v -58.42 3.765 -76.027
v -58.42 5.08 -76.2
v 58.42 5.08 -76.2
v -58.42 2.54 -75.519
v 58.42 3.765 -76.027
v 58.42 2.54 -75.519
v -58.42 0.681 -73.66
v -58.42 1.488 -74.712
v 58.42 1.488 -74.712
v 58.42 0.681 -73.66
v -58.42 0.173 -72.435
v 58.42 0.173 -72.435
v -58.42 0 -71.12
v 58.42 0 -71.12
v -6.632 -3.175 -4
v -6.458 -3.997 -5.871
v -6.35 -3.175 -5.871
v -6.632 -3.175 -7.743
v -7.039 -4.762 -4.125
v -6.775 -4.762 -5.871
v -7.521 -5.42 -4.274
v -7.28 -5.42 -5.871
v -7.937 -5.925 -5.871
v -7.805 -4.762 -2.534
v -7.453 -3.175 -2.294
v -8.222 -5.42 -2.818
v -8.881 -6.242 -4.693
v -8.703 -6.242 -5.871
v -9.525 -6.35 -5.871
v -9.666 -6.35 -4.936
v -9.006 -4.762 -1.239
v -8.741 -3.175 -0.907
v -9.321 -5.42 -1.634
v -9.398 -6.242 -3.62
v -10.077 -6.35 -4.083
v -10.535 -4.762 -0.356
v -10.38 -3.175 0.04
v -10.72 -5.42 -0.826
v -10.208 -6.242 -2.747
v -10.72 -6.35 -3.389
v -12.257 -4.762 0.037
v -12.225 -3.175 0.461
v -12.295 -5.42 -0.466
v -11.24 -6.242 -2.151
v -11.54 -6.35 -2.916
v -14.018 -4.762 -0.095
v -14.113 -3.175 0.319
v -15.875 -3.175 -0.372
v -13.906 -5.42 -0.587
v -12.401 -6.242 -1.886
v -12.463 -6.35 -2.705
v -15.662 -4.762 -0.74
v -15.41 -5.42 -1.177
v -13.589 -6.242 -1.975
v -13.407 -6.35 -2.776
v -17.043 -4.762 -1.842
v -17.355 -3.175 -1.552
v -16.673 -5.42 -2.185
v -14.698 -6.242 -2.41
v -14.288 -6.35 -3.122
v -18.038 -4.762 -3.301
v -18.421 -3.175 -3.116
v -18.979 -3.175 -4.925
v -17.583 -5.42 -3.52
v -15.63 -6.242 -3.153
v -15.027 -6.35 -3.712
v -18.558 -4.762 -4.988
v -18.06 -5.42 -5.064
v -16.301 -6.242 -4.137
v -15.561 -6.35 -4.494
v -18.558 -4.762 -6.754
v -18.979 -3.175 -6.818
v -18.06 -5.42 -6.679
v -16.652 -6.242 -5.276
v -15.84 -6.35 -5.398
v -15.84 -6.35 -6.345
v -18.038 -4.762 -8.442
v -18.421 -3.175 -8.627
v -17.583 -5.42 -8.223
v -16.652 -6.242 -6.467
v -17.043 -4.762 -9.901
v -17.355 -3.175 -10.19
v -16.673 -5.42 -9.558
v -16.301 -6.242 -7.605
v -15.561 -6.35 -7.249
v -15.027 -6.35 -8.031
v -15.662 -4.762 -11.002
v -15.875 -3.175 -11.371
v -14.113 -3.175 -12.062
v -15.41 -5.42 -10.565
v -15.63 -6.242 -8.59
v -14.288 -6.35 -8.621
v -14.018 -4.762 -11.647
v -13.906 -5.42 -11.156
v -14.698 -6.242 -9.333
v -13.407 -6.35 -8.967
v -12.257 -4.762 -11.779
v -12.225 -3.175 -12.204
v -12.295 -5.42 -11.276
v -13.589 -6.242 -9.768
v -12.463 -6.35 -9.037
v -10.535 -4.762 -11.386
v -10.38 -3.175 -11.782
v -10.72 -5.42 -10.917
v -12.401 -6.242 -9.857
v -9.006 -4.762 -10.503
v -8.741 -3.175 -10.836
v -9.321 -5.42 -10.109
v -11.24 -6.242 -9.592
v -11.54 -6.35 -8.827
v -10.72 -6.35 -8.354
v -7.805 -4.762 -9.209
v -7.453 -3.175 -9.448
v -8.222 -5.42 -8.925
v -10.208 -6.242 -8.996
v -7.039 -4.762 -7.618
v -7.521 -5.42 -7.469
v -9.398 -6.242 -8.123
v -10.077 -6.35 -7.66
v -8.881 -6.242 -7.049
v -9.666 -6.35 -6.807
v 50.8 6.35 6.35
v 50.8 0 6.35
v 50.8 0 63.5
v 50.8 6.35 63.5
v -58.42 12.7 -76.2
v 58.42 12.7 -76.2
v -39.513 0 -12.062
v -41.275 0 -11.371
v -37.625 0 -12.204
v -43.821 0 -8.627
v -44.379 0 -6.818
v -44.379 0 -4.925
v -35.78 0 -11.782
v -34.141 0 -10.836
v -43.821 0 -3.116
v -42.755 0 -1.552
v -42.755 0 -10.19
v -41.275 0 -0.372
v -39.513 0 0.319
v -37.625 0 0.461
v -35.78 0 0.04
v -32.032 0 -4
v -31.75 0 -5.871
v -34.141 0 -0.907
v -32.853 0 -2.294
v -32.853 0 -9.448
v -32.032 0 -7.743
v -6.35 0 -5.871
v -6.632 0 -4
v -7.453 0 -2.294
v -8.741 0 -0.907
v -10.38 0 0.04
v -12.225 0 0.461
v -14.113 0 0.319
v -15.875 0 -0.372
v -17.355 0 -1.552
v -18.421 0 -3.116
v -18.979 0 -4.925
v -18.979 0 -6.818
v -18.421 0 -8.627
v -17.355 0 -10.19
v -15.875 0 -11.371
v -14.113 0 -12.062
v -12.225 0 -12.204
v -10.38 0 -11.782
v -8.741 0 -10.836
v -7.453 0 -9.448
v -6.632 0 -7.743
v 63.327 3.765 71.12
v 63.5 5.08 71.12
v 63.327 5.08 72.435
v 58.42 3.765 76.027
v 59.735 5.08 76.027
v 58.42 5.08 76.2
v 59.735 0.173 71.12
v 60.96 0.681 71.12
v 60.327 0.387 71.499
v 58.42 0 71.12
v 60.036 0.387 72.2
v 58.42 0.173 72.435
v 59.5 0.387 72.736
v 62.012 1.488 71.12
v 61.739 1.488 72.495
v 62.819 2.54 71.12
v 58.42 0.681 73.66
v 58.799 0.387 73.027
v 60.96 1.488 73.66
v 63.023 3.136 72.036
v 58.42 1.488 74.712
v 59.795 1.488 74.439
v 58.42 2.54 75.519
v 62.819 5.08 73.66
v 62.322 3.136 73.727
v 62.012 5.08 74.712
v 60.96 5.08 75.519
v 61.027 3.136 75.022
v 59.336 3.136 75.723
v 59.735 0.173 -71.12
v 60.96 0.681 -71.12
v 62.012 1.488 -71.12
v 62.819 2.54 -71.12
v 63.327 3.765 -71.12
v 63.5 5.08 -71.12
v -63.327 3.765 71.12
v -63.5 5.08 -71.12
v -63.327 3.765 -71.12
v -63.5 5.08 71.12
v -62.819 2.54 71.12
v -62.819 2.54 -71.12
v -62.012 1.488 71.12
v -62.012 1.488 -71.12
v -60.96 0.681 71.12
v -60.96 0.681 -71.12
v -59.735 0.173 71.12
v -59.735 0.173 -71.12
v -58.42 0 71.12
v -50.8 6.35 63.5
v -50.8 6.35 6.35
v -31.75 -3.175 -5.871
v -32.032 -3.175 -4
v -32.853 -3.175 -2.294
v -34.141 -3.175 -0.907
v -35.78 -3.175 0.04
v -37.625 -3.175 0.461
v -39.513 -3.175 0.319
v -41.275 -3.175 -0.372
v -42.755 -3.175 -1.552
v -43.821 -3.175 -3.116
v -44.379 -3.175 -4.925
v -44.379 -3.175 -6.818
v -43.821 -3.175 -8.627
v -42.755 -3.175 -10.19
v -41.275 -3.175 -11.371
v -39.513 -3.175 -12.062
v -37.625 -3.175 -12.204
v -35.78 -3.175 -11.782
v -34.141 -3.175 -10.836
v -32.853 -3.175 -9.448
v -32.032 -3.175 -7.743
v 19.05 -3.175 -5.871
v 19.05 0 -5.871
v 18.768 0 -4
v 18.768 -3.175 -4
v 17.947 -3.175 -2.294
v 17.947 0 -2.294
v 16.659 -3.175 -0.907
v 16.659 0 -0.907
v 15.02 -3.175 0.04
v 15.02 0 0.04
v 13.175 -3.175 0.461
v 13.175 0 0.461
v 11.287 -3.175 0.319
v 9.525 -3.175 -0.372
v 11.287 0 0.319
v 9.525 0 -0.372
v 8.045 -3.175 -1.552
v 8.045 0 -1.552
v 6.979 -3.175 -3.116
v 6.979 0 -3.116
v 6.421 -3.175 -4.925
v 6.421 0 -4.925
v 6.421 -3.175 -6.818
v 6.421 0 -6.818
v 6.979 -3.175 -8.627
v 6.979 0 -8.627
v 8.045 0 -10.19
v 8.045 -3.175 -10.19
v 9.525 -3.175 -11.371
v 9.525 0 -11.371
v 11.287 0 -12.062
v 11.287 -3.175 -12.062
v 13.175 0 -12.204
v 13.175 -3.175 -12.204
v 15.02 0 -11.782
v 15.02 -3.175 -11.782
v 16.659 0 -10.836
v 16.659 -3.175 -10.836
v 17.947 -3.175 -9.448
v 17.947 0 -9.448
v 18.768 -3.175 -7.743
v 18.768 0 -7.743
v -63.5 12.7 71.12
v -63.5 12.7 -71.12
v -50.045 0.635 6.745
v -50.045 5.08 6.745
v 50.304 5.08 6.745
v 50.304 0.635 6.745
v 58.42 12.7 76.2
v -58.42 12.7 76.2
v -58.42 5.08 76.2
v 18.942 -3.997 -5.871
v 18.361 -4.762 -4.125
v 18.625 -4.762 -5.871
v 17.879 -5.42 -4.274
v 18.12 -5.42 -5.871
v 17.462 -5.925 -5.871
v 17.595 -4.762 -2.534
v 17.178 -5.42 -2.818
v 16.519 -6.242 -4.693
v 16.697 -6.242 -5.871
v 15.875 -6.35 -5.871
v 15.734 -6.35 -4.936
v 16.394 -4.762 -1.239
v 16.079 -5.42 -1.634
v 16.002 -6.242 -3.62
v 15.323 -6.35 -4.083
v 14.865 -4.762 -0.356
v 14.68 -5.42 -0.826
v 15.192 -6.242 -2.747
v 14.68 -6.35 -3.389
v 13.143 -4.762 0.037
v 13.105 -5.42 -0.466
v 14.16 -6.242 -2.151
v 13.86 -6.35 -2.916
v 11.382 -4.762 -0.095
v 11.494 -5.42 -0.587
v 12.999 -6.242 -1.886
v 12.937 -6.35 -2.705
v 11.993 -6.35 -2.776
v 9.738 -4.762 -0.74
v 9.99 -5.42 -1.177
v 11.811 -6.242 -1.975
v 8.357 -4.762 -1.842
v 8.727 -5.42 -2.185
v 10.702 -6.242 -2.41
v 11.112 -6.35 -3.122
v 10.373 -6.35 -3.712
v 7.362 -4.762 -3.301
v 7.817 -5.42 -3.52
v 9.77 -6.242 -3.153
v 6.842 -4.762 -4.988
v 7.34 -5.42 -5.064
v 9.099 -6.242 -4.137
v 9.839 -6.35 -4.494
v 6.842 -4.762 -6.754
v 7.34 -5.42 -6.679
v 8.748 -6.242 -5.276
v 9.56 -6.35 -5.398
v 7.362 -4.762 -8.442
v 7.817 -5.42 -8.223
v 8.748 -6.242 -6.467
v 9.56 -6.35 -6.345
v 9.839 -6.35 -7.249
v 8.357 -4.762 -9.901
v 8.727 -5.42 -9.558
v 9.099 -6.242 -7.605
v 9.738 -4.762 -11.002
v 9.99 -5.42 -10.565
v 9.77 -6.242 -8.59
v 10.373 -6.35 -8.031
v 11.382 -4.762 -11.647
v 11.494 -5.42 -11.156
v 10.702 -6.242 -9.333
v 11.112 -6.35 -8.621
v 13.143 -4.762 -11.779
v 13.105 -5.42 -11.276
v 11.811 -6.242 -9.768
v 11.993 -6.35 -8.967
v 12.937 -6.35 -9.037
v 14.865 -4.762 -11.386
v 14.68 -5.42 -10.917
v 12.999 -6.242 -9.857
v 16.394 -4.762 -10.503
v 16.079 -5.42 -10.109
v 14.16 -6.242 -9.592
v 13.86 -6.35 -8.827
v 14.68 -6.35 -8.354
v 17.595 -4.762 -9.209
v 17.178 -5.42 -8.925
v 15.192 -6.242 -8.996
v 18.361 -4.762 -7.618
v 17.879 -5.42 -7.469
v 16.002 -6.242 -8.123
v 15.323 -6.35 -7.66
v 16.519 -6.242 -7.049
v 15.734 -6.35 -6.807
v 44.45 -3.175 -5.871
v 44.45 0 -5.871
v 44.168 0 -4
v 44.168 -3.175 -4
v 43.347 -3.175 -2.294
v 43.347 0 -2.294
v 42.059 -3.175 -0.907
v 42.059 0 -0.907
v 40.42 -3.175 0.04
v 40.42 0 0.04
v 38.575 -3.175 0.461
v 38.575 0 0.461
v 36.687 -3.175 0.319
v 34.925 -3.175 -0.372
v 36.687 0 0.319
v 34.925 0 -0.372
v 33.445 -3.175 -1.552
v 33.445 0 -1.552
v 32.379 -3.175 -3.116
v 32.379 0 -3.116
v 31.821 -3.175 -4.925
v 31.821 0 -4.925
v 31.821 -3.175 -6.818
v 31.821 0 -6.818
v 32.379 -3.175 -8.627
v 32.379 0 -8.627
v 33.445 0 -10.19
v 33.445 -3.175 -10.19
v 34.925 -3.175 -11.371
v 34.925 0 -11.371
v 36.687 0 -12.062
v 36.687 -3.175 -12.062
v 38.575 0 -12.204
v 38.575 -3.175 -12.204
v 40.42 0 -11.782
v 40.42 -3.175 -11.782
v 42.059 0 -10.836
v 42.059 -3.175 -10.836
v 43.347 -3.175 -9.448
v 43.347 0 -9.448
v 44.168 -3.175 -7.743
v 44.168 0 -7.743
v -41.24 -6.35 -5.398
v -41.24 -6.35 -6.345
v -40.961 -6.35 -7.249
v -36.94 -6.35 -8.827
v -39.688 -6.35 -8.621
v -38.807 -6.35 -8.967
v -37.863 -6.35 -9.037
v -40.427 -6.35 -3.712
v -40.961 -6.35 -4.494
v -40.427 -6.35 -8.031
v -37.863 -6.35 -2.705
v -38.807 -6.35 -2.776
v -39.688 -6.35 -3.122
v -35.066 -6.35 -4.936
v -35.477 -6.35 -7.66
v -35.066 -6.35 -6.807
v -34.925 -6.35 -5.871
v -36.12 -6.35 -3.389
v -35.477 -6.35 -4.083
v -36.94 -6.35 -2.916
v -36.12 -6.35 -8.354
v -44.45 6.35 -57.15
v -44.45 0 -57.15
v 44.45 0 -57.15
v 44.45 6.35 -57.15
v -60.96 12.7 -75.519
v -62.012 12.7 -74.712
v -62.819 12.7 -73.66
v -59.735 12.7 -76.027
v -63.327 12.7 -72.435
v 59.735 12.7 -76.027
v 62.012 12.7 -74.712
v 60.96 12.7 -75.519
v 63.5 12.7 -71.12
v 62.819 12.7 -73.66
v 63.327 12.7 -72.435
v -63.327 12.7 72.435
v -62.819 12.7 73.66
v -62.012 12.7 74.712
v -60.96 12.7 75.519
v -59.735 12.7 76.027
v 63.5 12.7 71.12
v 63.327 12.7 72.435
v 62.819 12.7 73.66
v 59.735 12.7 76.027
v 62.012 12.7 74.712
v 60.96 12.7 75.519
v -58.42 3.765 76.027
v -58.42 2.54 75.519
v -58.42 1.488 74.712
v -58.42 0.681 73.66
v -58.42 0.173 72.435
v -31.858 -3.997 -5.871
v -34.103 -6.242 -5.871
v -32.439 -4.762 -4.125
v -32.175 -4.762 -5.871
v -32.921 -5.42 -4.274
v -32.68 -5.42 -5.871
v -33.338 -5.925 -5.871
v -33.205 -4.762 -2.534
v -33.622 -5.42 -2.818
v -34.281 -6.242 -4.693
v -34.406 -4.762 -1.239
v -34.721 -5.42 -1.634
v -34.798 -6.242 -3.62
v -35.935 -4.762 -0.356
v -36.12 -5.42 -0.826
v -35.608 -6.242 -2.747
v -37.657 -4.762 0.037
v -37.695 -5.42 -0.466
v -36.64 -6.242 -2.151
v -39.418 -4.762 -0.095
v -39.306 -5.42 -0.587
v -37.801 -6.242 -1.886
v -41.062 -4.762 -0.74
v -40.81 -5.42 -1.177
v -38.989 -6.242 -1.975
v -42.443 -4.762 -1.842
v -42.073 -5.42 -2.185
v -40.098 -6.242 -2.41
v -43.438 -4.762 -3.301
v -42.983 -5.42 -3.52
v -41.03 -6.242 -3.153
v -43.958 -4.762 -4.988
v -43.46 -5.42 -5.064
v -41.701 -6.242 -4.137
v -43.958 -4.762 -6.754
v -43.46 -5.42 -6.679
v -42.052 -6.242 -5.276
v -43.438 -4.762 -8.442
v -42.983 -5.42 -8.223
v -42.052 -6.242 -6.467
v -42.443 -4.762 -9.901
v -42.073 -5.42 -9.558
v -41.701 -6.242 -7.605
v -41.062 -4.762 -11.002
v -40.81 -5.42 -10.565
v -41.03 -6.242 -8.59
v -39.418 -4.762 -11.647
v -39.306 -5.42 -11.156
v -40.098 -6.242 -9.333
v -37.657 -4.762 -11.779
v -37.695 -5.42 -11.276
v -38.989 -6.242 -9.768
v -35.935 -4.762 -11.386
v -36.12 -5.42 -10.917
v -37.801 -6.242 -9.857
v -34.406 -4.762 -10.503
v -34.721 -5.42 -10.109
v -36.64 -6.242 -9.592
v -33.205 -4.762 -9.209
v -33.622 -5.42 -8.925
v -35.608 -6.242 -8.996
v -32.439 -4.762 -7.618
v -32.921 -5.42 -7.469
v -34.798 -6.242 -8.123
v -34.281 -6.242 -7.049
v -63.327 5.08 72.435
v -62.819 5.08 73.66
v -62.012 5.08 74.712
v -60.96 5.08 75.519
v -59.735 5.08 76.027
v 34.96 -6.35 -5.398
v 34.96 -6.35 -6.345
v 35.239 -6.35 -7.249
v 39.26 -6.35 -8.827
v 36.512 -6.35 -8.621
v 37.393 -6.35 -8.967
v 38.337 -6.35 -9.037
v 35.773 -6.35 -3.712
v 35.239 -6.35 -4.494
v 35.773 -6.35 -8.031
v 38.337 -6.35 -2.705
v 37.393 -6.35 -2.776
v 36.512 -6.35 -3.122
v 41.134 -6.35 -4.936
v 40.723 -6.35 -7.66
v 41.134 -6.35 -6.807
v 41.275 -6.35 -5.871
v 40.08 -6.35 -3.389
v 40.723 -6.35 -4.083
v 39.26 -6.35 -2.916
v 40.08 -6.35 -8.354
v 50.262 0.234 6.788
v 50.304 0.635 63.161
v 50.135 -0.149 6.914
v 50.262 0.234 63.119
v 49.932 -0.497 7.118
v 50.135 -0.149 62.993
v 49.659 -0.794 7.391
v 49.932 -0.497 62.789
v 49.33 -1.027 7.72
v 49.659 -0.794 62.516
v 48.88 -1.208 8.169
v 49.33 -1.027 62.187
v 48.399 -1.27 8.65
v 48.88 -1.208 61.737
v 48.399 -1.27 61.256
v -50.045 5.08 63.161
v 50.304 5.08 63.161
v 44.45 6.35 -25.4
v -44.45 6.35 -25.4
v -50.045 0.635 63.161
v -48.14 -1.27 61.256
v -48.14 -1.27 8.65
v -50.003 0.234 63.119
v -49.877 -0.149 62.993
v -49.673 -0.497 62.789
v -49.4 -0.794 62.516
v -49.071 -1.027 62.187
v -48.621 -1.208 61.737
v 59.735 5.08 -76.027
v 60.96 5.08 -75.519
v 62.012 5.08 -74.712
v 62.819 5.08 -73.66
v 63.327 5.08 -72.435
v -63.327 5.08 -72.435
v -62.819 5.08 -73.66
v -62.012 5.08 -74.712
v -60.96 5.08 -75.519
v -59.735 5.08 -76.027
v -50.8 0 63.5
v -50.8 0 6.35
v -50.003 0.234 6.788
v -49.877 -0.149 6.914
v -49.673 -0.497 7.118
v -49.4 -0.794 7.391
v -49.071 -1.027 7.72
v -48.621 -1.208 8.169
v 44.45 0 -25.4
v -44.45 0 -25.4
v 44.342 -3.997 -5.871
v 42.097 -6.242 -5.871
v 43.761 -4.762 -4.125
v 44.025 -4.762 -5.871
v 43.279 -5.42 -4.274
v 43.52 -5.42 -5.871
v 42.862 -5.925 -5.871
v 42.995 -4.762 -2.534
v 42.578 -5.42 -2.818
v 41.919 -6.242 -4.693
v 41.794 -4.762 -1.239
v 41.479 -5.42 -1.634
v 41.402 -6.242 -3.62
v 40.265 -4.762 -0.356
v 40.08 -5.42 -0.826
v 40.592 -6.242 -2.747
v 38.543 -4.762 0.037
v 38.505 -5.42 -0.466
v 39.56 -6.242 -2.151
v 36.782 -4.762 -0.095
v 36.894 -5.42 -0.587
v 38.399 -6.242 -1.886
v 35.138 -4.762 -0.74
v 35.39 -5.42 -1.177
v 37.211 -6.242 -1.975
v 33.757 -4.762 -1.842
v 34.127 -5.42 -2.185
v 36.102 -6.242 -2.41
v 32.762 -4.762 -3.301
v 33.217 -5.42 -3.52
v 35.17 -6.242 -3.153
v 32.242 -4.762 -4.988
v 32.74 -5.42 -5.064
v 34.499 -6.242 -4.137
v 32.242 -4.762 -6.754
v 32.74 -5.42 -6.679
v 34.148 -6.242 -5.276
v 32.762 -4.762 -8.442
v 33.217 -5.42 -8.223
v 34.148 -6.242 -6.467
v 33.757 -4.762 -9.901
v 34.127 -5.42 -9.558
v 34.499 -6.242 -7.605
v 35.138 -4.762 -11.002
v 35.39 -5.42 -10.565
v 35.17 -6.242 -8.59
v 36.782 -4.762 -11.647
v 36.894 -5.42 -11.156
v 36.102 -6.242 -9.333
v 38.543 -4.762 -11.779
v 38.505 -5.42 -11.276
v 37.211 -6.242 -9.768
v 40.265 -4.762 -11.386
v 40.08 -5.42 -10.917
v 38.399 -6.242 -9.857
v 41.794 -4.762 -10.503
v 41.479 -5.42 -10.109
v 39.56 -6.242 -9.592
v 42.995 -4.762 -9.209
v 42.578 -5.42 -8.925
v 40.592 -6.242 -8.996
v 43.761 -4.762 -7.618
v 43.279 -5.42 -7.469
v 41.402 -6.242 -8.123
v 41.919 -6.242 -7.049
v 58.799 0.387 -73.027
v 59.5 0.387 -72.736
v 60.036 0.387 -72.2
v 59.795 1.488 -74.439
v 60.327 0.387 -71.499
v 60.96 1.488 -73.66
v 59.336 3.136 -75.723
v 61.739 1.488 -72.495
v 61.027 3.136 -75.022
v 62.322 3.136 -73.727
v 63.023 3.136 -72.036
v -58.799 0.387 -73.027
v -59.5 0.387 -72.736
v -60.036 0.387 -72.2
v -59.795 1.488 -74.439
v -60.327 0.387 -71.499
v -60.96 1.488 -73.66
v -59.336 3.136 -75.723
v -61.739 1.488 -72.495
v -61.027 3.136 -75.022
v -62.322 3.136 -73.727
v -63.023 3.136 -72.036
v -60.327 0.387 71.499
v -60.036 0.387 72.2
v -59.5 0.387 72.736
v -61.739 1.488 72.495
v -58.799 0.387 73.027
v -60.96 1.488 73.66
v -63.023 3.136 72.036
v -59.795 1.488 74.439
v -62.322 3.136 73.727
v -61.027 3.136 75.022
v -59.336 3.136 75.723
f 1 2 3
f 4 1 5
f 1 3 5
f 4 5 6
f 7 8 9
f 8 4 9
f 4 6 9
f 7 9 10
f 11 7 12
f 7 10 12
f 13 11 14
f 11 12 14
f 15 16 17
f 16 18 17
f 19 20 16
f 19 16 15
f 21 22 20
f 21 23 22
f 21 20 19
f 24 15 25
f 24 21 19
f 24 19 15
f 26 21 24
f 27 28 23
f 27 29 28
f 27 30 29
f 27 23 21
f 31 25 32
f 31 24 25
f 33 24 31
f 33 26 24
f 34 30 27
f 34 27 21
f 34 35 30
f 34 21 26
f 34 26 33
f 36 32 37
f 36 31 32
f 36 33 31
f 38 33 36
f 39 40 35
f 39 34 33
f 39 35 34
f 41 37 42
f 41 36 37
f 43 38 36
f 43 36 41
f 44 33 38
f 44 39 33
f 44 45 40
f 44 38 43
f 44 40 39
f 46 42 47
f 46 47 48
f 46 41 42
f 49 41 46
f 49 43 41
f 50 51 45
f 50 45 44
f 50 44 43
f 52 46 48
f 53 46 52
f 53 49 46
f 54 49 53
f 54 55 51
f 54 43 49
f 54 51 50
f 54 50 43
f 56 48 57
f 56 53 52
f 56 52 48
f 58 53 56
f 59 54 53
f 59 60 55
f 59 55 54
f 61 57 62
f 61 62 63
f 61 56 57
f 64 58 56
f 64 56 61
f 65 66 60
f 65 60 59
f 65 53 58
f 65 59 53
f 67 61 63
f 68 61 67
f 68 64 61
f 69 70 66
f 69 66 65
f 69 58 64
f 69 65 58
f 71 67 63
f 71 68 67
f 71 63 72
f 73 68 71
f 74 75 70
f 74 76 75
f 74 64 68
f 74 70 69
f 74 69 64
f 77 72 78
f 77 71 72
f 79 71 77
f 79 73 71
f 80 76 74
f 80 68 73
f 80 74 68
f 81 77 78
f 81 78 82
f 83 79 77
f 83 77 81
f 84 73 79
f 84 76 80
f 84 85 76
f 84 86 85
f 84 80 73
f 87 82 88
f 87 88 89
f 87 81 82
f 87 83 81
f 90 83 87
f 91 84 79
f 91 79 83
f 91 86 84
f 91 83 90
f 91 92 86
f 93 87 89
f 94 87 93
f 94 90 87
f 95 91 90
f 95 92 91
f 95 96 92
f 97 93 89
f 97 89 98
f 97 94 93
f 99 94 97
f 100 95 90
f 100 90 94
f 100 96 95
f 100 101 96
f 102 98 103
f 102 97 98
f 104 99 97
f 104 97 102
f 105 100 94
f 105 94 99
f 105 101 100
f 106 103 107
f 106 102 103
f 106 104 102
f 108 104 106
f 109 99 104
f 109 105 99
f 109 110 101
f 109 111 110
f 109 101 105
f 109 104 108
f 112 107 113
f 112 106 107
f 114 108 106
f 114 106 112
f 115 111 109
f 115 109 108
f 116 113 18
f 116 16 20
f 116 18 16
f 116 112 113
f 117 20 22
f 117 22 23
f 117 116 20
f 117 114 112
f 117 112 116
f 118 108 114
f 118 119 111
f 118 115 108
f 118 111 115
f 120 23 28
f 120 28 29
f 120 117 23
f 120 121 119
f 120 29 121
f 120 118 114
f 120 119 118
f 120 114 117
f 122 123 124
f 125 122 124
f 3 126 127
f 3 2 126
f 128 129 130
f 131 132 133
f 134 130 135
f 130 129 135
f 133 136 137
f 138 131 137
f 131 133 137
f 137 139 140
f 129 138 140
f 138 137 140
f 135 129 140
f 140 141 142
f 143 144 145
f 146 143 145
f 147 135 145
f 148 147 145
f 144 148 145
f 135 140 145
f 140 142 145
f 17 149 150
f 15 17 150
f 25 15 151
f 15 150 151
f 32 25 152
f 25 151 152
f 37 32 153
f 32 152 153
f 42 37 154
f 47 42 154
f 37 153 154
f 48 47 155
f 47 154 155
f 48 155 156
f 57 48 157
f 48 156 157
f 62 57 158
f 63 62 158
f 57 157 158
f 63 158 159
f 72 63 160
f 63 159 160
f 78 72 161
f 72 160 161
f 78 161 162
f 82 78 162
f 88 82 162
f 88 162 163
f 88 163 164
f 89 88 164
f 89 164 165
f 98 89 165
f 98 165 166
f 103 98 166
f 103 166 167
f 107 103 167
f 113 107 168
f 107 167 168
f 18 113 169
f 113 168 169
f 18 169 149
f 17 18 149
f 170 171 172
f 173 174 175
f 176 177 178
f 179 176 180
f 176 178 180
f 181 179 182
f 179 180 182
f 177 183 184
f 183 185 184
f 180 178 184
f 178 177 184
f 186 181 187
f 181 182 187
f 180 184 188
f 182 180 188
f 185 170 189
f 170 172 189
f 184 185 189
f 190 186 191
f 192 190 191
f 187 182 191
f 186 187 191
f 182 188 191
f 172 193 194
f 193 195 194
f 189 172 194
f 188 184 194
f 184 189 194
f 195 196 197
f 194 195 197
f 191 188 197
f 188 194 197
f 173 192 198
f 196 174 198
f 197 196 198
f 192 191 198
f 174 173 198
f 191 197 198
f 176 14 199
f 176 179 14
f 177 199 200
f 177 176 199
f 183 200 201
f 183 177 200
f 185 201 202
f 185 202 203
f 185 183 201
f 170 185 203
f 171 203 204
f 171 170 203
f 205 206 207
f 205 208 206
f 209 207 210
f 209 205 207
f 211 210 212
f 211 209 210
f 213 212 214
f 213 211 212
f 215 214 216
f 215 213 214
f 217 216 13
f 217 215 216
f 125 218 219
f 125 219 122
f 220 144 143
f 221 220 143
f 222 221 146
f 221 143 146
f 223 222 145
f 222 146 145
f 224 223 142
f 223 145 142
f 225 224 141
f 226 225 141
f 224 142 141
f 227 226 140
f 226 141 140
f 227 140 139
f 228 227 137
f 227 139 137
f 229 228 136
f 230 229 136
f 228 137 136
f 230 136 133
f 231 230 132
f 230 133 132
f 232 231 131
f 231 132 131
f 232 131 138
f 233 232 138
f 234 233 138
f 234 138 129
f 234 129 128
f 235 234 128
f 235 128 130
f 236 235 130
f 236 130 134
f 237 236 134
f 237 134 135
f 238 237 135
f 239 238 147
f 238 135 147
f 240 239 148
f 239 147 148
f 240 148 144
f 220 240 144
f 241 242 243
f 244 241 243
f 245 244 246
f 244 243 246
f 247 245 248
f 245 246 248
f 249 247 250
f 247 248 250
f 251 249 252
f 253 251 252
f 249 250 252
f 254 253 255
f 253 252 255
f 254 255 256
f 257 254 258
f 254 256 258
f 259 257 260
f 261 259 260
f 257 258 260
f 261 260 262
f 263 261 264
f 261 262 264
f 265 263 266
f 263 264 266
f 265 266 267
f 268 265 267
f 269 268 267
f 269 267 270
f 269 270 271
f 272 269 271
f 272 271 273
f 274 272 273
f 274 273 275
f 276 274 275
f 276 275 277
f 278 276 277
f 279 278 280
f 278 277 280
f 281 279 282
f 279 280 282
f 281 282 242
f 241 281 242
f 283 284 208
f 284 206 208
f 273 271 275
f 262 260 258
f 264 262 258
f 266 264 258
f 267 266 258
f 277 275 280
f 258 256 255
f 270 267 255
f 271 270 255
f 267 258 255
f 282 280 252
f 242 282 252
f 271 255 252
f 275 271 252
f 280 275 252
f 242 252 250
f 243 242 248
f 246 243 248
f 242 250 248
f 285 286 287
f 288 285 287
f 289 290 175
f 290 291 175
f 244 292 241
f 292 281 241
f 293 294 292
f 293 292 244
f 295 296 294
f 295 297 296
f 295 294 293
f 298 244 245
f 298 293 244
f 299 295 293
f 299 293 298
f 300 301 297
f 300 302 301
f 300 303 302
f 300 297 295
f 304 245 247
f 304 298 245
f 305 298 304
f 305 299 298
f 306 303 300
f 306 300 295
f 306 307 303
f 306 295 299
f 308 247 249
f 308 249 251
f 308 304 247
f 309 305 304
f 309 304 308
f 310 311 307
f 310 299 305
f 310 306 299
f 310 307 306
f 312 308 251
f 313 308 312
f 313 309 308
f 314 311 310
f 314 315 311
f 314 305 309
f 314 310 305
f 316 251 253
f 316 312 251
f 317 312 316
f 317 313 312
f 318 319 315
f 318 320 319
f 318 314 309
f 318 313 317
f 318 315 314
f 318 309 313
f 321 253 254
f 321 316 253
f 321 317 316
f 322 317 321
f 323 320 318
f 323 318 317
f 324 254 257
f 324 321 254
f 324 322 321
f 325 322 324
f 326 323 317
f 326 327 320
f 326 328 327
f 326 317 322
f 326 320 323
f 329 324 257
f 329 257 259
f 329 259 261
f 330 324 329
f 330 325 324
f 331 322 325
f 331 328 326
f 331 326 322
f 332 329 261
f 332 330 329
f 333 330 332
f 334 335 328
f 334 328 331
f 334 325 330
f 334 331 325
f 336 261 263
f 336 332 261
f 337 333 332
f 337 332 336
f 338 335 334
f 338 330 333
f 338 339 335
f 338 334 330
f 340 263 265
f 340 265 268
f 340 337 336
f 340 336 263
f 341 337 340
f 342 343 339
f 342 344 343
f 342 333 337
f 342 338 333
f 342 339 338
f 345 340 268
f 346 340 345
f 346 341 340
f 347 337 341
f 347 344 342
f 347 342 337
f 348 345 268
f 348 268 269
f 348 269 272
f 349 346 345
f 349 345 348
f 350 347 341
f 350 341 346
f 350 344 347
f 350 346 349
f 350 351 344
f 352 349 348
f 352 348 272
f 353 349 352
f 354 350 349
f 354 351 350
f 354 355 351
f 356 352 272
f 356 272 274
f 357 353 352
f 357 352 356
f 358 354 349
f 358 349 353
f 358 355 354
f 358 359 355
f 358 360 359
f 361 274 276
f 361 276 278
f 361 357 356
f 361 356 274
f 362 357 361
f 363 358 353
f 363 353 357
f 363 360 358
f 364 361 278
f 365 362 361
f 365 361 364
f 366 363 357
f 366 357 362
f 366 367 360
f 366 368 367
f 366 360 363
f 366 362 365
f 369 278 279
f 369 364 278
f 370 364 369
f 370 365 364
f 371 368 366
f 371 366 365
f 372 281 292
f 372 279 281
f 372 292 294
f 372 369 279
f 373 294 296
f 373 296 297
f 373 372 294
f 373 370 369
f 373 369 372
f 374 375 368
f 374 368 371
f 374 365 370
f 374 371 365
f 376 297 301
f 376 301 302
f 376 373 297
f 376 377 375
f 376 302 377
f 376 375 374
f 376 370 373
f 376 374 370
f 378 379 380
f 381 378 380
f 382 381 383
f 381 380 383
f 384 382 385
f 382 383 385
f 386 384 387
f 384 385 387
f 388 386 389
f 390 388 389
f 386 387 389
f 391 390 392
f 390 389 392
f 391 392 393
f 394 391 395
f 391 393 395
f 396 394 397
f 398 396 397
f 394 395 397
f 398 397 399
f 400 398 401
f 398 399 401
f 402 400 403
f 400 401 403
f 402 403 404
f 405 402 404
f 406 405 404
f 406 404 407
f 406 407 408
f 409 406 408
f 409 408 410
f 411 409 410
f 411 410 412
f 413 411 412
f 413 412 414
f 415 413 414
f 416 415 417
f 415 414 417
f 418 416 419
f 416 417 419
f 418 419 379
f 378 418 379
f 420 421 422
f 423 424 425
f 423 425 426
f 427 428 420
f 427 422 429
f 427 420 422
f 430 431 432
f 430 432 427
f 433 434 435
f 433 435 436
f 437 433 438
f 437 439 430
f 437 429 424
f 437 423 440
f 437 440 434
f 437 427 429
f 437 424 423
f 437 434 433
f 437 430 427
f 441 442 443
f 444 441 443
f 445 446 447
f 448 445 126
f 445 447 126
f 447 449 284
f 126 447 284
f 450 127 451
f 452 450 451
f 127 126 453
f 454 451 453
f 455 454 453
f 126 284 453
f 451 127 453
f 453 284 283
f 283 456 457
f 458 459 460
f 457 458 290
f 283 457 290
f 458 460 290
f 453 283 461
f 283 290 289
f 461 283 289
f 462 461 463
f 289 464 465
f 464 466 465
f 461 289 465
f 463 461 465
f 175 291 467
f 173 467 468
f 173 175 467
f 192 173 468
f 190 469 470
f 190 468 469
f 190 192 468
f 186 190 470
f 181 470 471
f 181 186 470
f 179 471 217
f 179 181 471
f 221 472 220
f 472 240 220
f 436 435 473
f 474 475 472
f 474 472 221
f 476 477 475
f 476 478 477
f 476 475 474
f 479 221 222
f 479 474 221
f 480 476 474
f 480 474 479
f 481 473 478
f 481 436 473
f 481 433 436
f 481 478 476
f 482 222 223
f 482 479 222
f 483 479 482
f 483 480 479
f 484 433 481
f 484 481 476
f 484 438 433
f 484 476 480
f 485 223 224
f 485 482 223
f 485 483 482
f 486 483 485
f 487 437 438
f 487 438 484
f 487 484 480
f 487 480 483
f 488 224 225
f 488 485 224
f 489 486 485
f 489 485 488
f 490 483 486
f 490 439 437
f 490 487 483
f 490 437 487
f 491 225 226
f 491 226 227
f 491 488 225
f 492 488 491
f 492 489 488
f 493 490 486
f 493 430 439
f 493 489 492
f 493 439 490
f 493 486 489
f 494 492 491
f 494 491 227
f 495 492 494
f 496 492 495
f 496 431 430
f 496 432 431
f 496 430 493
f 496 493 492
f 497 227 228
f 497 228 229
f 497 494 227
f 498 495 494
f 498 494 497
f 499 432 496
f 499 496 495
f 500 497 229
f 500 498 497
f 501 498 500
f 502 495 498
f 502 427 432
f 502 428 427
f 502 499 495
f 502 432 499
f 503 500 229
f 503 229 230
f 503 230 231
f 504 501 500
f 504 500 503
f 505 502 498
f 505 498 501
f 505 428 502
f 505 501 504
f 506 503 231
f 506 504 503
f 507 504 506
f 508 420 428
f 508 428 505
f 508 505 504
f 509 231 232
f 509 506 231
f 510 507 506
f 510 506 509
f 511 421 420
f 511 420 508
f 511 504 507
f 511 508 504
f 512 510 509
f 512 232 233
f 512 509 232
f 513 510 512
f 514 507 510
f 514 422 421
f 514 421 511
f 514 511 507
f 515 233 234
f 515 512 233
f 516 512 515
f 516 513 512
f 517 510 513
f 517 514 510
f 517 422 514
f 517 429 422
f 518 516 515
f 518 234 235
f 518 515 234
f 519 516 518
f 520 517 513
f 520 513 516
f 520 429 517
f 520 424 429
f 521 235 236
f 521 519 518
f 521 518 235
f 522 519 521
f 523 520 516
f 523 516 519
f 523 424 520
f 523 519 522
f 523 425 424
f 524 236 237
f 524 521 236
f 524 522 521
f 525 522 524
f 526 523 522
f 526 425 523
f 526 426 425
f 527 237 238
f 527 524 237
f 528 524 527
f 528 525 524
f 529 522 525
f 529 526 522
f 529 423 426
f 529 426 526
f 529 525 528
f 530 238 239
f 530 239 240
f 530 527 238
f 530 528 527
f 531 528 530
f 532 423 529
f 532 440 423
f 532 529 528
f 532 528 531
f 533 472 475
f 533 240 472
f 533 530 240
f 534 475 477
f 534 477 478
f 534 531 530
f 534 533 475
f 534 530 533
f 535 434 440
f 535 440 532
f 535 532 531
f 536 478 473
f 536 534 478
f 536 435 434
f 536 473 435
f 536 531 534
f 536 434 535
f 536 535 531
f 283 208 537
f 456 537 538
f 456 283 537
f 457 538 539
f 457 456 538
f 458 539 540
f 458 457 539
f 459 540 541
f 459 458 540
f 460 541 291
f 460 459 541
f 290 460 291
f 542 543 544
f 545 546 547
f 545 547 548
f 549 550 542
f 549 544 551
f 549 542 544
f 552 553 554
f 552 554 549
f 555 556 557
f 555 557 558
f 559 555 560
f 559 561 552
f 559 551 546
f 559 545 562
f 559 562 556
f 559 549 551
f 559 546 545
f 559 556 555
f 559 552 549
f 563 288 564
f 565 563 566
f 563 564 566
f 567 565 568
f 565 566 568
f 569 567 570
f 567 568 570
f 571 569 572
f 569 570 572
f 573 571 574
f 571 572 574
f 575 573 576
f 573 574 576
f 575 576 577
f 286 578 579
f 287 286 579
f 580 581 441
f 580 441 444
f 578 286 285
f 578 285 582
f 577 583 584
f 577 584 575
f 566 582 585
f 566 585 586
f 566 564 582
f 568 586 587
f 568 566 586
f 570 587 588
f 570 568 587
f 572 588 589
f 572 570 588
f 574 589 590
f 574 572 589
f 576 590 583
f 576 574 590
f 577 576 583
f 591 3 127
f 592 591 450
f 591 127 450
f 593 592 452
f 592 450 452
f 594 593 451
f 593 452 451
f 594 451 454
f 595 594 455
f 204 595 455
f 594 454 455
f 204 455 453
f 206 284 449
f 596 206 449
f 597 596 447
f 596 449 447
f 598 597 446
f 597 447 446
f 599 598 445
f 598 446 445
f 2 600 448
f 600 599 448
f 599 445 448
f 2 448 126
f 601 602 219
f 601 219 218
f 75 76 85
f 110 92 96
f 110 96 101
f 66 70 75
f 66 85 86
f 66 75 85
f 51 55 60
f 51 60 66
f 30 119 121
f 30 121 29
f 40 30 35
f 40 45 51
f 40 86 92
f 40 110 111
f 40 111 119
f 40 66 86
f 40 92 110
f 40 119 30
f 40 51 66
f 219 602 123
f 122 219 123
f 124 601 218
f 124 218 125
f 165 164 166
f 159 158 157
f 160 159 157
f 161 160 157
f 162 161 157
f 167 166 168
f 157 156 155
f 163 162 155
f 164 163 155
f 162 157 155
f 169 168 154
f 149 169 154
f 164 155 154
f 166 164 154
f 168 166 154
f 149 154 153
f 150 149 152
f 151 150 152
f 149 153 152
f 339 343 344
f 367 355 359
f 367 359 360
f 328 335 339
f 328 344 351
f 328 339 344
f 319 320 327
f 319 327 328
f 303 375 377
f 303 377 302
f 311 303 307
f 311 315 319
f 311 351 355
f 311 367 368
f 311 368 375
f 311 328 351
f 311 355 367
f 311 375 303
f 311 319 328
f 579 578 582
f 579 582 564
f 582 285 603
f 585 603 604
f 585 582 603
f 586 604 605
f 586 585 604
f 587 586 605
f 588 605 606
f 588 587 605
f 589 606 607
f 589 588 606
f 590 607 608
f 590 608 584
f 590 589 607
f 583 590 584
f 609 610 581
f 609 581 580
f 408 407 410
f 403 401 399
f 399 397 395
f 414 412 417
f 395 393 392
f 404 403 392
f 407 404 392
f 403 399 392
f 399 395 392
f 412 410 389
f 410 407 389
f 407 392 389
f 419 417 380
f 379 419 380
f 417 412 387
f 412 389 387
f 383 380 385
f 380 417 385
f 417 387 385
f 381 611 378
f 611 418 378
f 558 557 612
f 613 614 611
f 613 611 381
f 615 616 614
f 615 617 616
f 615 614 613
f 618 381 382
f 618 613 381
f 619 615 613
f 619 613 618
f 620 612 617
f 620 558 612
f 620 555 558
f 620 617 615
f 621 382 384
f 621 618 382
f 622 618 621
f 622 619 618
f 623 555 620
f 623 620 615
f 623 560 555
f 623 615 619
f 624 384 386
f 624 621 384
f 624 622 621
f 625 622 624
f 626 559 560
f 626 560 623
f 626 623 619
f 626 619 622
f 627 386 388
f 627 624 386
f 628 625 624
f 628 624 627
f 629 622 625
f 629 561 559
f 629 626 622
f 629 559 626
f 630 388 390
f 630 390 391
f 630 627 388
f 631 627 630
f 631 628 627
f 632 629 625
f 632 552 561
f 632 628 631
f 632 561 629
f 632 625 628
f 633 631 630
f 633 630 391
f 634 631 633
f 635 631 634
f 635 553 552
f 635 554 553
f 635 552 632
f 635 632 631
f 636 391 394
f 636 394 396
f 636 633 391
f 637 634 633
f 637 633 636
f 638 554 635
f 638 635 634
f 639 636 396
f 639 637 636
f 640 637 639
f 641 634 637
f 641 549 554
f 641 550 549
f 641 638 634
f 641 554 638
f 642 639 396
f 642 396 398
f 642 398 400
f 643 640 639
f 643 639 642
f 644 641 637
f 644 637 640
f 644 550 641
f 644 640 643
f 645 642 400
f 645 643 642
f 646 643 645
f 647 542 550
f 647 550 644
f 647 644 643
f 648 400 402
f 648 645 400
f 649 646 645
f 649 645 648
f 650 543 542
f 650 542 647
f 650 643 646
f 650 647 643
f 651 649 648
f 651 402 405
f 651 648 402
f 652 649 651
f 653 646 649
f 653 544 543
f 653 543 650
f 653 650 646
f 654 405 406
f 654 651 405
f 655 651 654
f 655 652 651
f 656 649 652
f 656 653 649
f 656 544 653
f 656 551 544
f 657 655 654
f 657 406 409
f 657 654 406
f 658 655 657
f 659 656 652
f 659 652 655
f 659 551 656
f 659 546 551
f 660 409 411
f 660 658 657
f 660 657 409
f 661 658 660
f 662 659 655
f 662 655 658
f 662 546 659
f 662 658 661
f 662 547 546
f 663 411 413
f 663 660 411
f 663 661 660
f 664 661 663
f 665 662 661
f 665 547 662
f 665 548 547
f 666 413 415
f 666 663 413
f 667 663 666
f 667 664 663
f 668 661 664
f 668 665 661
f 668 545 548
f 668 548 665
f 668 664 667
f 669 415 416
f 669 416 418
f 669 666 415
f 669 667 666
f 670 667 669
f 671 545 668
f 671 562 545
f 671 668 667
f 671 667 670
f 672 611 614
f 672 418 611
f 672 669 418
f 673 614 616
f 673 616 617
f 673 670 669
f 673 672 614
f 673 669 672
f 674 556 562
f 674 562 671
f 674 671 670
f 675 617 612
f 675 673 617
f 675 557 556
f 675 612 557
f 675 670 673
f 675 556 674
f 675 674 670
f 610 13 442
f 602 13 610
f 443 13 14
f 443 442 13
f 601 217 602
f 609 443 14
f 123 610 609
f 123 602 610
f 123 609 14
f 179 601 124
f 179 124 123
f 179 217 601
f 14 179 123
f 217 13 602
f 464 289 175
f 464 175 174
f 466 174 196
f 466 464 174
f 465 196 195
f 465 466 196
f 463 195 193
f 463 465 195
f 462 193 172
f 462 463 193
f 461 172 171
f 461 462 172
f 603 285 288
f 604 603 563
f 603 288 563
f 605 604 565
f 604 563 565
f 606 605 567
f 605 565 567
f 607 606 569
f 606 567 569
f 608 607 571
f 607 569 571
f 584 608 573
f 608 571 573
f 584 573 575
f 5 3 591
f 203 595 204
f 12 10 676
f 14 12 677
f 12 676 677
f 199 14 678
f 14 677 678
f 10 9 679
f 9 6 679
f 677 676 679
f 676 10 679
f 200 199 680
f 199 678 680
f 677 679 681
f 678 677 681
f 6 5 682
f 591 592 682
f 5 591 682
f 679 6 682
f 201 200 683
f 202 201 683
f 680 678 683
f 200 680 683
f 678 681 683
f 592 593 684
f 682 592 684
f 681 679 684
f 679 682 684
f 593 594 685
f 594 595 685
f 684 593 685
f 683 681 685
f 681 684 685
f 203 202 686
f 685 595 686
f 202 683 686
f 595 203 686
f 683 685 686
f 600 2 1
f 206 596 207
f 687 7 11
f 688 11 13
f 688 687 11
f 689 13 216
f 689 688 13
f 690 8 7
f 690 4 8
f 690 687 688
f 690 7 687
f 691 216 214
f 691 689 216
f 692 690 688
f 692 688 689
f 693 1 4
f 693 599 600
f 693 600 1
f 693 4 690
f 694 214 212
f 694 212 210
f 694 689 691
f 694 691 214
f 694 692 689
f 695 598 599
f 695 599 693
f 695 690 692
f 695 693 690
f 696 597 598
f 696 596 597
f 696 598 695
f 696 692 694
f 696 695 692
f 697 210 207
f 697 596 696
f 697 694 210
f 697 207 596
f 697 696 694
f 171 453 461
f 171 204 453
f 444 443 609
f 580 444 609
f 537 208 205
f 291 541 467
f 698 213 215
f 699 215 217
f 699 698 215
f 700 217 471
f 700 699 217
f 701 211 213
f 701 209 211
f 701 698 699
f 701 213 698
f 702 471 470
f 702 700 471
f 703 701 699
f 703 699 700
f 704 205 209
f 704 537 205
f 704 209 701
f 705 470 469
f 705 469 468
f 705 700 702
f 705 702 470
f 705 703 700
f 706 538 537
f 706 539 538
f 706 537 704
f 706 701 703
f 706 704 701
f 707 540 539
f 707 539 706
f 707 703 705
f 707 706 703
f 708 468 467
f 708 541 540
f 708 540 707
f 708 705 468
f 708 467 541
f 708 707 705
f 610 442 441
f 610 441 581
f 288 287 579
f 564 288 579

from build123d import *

# Parameters (mm, degrees)
F0_W     = 127
F0_H     = 152.4
F1_DEPTH = 12.7
F2_W     = 101.6
F2_H     = 57.15
F2_W_2   = 88.9
F2_H_2   = 31.75
F3_DEPTH = 6.35
F2_R     = 6.35
F4_DEPTH = 6.35
F6_W     = 100.3496237099
F6_H     = 56.4160710201
F7_DEPTH = 6.35
F8_R     = 3.175
F8_2_R   = 3.175
F8_3_R   = 3.175
F8_4_R   = 3.175
F9_R     = 1.905
F10_R    = 5.08


with BuildPart() as f1:
    # F0 (on Front) → F1 (new body)
    with BuildSketch(Plane.XZ):
        Rectangle(F0_W, F0_H)
    extrude(amount=-F1_DEPTH)

    # F2 (on face) → F3 (cut)
    with BuildSketch(Plane.XZ):
        with Locations((0, 34.925)):
            Rectangle(F2_W, F2_H)
        with Locations((0, -41.275)):
            Rectangle(F2_W_2, F2_H_2)
    extrude(amount=-F3_DEPTH, mode=Mode.SUBTRACT)

    # F10
    f10_edges = [f1.edges().sort_by_distance(p)[0] for p in [
        (-63.5, 6.35, 76.2),
        (63.5, 6.35, 76.2),
        (63.5, 6.35, -76.2),
        (-63.5, 6.35, -76.2),
        (0, 0, -76.2),
        (-63.5, 0, 0),
        (63.5, 0, 0),
        (0, 0, 76.2),
    ]]
    fillet(f10_edges, radius=F10_R)


with BuildPart() as f4:
    # F2 (on face) → F4 (new body)
    with BuildSketch(Plane.XZ):
        with Locations((-38.1, -5.8713643812)):
            Circle(F2_R)
    extrude(amount=F4_DEPTH)

    # F8
    f8_edges = [f4.edges().sort_by_distance(p)[0] for p in [
        (-44.45, -6.35, -5.871364),
    ]]
    fillet(f8_edges, radius=F8_R)


with BuildPart() as f4b:
    # F2 (on face) → F4, piece 2 (new body)
    with BuildSketch(Plane.XZ):
        with Locations((-12.7, -5.8713643812)):
            Circle(F2_R)
    extrude(amount=F4_DEPTH)

    # F8#2
    f8_2_edges = [f4b.edges().sort_by_distance(p)[0] for p in [
        (-19.05, -6.35, -5.871364),
    ]]
    fillet(f8_2_edges, radius=F8_2_R)


with BuildPart() as f4c:
    # F2 (on face) → F4, piece 3 (new body)
    with BuildSketch(Plane.XZ):
        with Locations((12.7, -5.8713643812)):
            Circle(F2_R)
    extrude(amount=F4_DEPTH)

    # F8#3
    f8_3_edges = [f4c.edges().sort_by_distance(p)[0] for p in [
        (6.35, -6.35, -5.871364),
    ]]
    fillet(f8_3_edges, radius=F8_3_R)


with BuildPart() as f4d:
    # F2 (on face) → F4, piece 4 (new body)
    with BuildSketch(Plane.XZ):
        with Locations((38.1, -5.8713643812)):
            Circle(F2_R)
    extrude(amount=F4_DEPTH)

    # F8#4
    f8_4_edges = [f4d.edges().sort_by_distance(p)[0] for p in [
        (31.75, -6.35, -5.871364),
    ]]
    fillet(f8_4_edges, radius=F8_4_R)


with BuildPart() as f7:
    # F6 (on offset) → F7 (new body)
    with BuildSketch(Plane.XZ.offset(-5.08)):
        with Locations((0.1294519752, 34.953397233)):
            Rectangle(F6_W, F6_H)
    extrude(amount=F7_DEPTH)

    # F9
    f9_edges = [f7.edges().sort_by_distance(p)[0] for p in [
        (-50.04536, -1.27, 34.953397),
        (0.129452, -1.27, 63.161433),
        (0.129452, -1.27, 6.745362),
        (50.304264, -1.27, 34.953397),
    ]]
    fillet(f9_edges, radius=F9_R)


solid = Compound([f1.part, f4.part, f4b.part, f4c.part, f4d.part, f7.part])
